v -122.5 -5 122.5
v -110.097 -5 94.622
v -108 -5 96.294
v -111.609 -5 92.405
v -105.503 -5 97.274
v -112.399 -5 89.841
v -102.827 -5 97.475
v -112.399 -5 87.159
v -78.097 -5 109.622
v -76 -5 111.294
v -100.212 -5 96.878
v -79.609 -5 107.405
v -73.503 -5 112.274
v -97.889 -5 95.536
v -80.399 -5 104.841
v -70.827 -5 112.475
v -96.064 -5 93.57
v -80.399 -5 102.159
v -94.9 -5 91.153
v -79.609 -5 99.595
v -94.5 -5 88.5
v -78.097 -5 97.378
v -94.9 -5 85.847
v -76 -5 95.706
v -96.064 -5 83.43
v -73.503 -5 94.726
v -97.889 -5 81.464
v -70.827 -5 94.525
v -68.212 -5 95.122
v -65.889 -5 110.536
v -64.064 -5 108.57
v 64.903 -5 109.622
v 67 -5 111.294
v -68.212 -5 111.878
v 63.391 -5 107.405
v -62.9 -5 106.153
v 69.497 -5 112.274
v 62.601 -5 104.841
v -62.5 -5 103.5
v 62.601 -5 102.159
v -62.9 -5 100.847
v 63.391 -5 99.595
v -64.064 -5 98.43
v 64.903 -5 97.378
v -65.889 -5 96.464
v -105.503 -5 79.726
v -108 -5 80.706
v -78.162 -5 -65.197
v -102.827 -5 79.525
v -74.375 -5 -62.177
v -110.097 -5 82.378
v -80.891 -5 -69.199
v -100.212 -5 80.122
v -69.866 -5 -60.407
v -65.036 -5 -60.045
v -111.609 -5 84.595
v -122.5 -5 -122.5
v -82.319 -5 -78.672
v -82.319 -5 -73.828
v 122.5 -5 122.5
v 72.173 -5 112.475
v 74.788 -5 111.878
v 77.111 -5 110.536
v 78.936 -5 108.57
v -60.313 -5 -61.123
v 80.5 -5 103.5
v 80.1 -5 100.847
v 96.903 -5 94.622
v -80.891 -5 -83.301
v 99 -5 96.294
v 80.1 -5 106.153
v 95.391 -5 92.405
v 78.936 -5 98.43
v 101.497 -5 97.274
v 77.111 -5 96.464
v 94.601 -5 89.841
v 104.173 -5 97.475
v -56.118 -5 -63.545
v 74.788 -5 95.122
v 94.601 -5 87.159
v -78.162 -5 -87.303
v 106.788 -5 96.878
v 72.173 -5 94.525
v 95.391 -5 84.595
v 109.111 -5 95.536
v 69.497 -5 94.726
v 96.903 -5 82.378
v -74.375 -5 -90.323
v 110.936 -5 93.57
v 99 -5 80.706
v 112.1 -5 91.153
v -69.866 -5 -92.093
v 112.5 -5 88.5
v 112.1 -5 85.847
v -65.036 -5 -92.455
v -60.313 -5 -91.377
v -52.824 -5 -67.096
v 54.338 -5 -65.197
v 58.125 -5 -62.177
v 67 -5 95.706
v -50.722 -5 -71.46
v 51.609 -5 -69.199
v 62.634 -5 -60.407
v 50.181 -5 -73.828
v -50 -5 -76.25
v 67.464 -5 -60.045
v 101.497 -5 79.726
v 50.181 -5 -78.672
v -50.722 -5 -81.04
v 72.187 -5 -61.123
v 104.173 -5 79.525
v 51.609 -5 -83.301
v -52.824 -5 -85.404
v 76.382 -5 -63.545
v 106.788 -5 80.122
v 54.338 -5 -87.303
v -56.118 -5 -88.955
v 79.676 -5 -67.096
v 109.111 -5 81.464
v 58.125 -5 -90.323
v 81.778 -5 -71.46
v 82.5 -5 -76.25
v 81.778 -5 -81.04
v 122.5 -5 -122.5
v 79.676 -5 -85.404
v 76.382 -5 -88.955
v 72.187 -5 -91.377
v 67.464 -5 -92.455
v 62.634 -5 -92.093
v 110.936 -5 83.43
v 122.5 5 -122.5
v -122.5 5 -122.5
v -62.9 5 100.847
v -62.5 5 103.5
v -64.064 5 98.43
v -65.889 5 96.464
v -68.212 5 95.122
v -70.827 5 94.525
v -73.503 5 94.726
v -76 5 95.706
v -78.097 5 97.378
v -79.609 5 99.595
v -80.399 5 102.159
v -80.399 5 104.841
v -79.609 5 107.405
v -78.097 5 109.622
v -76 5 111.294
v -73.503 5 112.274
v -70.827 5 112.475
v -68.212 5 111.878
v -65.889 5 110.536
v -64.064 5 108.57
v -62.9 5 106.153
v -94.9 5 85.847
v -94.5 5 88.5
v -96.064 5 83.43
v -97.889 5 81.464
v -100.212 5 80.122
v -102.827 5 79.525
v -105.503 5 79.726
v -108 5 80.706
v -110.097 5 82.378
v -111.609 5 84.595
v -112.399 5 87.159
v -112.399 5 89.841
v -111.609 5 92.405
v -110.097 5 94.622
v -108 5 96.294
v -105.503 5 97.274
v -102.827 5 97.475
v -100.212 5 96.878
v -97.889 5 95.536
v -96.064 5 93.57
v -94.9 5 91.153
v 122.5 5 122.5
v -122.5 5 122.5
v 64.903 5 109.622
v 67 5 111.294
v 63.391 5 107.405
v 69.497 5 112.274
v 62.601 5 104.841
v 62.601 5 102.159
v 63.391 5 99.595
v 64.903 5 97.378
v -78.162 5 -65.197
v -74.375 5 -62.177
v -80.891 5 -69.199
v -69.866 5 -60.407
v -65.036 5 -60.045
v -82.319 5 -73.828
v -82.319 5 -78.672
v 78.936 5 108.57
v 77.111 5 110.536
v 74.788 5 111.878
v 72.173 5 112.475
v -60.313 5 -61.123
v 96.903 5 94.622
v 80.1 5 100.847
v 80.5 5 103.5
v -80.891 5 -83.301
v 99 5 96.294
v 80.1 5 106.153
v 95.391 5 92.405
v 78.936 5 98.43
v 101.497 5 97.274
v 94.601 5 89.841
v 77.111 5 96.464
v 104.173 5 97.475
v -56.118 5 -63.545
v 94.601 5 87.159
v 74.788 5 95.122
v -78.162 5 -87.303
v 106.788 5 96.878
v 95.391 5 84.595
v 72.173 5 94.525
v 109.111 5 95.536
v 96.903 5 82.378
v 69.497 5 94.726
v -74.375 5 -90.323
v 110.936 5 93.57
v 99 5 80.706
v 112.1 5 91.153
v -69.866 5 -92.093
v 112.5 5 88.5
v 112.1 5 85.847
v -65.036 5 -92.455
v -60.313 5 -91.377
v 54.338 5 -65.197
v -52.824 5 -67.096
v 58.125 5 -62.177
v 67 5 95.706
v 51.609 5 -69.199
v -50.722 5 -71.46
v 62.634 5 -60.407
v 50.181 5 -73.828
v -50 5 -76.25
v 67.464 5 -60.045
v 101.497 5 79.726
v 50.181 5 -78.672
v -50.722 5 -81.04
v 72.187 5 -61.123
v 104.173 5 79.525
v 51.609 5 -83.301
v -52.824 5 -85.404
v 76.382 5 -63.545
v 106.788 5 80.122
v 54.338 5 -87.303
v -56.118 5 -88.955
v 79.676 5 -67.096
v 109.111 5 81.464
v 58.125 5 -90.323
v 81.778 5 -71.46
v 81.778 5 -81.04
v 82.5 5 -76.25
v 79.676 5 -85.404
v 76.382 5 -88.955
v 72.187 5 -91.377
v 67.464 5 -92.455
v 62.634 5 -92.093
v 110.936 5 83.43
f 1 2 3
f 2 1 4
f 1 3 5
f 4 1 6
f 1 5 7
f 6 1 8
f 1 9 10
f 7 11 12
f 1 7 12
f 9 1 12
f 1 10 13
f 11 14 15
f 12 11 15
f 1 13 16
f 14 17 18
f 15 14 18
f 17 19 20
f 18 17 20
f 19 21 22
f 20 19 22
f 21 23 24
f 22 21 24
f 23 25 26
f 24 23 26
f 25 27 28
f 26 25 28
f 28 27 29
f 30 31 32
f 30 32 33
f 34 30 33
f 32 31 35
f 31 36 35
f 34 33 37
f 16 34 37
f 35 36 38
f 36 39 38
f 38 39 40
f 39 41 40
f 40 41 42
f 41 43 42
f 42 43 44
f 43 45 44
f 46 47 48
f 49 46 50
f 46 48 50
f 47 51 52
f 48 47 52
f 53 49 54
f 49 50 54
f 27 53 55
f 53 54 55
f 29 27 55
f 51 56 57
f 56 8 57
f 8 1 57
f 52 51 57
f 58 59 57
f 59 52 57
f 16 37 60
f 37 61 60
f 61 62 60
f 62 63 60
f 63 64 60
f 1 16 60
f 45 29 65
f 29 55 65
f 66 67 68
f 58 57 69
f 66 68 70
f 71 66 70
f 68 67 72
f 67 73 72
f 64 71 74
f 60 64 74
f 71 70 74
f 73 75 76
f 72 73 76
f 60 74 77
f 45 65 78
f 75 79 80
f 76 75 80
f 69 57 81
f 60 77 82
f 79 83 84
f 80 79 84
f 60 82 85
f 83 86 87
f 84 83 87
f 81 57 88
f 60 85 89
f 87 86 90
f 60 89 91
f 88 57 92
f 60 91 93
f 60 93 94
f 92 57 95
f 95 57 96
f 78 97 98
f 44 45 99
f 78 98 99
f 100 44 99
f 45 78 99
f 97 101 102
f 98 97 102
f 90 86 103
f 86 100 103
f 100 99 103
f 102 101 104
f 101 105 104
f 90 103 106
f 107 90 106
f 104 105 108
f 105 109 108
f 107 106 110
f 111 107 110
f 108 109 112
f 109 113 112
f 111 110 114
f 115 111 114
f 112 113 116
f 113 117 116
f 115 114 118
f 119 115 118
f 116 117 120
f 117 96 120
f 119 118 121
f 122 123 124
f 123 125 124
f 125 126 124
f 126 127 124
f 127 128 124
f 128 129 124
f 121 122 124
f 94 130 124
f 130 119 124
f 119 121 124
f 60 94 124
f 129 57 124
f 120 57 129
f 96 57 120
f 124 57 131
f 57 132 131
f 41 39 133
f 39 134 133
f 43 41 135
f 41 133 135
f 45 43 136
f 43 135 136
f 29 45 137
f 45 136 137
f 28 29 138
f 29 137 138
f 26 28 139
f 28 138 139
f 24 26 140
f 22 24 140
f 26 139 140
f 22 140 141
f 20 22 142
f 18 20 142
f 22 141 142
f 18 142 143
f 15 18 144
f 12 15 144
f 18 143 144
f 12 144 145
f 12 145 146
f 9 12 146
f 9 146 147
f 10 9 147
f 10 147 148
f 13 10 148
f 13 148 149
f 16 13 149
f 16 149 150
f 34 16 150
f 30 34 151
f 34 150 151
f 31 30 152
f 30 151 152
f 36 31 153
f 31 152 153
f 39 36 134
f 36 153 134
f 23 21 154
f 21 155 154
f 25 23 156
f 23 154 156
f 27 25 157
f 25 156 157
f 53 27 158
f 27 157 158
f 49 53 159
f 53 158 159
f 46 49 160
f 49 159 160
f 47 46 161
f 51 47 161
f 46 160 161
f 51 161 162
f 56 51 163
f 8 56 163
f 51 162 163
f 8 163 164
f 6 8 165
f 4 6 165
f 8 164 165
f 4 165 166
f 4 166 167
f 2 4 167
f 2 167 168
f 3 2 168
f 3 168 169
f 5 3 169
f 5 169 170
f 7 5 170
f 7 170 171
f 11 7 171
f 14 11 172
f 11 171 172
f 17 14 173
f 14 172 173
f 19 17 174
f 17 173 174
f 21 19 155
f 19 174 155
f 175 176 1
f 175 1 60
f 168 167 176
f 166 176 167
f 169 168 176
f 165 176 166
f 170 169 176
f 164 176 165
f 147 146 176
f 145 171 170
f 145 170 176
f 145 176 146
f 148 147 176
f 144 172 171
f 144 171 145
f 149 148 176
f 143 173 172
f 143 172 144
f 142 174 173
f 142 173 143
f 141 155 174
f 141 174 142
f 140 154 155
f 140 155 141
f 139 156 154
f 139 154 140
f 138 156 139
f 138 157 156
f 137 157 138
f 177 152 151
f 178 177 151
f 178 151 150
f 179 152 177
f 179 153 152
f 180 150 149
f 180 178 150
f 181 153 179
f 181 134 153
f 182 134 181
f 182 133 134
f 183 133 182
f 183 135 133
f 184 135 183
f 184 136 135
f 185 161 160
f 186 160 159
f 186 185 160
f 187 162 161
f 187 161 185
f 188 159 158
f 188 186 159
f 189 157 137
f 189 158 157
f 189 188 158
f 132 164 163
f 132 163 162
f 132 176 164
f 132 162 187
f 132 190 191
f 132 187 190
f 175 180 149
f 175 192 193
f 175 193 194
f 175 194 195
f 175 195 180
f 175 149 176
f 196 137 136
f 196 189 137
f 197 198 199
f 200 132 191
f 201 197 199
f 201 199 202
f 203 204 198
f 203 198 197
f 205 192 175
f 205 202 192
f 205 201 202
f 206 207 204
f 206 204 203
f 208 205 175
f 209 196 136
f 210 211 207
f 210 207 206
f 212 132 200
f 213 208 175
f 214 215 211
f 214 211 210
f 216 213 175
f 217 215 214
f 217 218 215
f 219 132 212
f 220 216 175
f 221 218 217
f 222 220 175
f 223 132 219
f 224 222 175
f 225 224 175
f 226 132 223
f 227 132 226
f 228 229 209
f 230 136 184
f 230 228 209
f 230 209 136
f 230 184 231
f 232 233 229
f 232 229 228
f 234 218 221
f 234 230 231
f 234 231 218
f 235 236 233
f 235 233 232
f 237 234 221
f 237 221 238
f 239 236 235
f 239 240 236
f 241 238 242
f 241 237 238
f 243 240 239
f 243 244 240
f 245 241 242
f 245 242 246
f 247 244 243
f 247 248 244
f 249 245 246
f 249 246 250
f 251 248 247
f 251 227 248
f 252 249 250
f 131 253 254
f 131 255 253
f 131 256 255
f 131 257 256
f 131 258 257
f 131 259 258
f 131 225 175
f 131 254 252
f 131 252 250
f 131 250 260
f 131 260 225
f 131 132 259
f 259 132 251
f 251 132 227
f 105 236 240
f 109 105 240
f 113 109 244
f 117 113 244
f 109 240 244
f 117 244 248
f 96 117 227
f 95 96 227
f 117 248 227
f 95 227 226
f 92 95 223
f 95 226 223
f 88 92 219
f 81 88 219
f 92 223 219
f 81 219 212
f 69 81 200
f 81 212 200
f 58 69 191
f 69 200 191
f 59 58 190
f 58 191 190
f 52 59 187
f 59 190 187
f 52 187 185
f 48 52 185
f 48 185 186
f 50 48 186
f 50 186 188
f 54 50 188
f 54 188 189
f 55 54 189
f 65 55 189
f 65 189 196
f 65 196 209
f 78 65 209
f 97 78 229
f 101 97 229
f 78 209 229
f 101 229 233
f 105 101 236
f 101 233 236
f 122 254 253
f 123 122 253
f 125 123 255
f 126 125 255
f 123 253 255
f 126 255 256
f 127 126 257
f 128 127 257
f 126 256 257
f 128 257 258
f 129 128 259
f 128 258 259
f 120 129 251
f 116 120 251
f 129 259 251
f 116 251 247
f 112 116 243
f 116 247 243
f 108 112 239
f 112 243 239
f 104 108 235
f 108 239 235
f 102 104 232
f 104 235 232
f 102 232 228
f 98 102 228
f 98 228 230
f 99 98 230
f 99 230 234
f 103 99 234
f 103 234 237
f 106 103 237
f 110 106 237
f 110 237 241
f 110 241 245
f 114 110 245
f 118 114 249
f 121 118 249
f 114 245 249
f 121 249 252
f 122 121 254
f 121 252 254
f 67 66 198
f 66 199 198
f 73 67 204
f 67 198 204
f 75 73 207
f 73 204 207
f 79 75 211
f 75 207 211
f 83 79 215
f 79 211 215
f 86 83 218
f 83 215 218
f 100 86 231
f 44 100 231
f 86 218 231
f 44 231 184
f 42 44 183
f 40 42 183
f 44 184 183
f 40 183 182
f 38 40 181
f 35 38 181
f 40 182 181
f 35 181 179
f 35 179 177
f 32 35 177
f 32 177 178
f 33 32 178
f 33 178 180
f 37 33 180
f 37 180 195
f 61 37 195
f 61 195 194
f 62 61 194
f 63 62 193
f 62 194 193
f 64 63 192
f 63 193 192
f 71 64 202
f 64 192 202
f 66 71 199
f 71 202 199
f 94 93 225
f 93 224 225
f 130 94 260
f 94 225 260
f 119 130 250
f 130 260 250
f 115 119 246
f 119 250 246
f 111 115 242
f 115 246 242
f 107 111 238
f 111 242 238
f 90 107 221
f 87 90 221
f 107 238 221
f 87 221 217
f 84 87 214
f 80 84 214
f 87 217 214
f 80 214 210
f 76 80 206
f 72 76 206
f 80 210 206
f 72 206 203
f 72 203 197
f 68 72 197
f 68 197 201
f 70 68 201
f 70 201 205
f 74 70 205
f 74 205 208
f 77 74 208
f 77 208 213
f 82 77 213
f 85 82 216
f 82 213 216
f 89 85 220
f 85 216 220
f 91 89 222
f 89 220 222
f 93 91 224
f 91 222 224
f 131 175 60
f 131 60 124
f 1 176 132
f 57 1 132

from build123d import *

# Parameters (mm, degrees)
SKETCH1_W               = 245
SKETCH1_H               = 245
BOSS_EXTRUDE1_DEPTH     = 5
SKETCH2_R               = 16.25
CUT_EXTRUDE1_DEPTH      = 10
SKETCH3_R               = 9
CUT_EXTRUDE2_DEPTH      = 10
SKETCH3_3_R             = 9
CUT_EXTRUDE3_DEPTH      = 6
CUT_EXTRUDE3_DEPTH_BACK = 6


with BuildPart() as part:
    # Sketch1 → Boss-Extrude1 (new body, symmetric)
    with BuildSketch(Plane(origin=(0, 0, 0), x_dir=(1, 0, 0), z_dir=(0, 1, 0))):
        Rectangle(SKETCH1_W, SKETCH1_H)
    extrude(amount=BOSS_EXTRUDE1_DEPTH, both=True)

    # Sketch2 → Cut-Extrude1 (cut)
    with BuildSketch(Plane(origin=(0, 5, 0), x_dir=(1, 0, 0), z_dir=(0, 1, 0))):
        with Locations((-66.25, 76.25)):
            Circle(SKETCH2_R)
        with Locations((66.25, 76.25)):
            Circle(SKETCH2_R)
    extrude(amount=-CUT_EXTRUDE1_DEPTH, mode=Mode.SUBTRACT)

    # Sketch3 → Cut-Extrude2 (cut)
    with BuildSketch(Plane(origin=(0, 0, 0), x_dir=(1, 0, 0), z_dir=(0, 1, 0))):
        with Locations((71.5, -103.5)):
            Circle(SKETCH3_R)
    extrude(amount=-CUT_EXTRUDE2_DEPTH, mode=Mode.SUBTRACT)

    # Sketch3<3> → Cut-Extrude3 (cut, two sides)
    with BuildSketch(Plane(origin=(0, 0, 0), x_dir=(1, 0, 0), z_dir=(0, 1, 0))) as cut_extrude3_sk:
        with Locations((103.5, -88.5)):
            Circle(SKETCH3_3_R)
        with Locations((71.5, -103.5)):
            Circle(SKETCH3_3_R)
        with Locations((-71.5, -103.5)):
            Circle(SKETCH3_3_R)
        with Locations((-103.5, -88.5)):
            Circle(SKETCH3_3_R)
    extrude(amount=CUT_EXTRUDE3_DEPTH, mode=Mode.SUBTRACT)
    extrude(cut_extrude3_sk.sketch, amount=-CUT_EXTRUDE3_DEPTH_BACK, mode=Mode.SUBTRACT)


solid = part.part
